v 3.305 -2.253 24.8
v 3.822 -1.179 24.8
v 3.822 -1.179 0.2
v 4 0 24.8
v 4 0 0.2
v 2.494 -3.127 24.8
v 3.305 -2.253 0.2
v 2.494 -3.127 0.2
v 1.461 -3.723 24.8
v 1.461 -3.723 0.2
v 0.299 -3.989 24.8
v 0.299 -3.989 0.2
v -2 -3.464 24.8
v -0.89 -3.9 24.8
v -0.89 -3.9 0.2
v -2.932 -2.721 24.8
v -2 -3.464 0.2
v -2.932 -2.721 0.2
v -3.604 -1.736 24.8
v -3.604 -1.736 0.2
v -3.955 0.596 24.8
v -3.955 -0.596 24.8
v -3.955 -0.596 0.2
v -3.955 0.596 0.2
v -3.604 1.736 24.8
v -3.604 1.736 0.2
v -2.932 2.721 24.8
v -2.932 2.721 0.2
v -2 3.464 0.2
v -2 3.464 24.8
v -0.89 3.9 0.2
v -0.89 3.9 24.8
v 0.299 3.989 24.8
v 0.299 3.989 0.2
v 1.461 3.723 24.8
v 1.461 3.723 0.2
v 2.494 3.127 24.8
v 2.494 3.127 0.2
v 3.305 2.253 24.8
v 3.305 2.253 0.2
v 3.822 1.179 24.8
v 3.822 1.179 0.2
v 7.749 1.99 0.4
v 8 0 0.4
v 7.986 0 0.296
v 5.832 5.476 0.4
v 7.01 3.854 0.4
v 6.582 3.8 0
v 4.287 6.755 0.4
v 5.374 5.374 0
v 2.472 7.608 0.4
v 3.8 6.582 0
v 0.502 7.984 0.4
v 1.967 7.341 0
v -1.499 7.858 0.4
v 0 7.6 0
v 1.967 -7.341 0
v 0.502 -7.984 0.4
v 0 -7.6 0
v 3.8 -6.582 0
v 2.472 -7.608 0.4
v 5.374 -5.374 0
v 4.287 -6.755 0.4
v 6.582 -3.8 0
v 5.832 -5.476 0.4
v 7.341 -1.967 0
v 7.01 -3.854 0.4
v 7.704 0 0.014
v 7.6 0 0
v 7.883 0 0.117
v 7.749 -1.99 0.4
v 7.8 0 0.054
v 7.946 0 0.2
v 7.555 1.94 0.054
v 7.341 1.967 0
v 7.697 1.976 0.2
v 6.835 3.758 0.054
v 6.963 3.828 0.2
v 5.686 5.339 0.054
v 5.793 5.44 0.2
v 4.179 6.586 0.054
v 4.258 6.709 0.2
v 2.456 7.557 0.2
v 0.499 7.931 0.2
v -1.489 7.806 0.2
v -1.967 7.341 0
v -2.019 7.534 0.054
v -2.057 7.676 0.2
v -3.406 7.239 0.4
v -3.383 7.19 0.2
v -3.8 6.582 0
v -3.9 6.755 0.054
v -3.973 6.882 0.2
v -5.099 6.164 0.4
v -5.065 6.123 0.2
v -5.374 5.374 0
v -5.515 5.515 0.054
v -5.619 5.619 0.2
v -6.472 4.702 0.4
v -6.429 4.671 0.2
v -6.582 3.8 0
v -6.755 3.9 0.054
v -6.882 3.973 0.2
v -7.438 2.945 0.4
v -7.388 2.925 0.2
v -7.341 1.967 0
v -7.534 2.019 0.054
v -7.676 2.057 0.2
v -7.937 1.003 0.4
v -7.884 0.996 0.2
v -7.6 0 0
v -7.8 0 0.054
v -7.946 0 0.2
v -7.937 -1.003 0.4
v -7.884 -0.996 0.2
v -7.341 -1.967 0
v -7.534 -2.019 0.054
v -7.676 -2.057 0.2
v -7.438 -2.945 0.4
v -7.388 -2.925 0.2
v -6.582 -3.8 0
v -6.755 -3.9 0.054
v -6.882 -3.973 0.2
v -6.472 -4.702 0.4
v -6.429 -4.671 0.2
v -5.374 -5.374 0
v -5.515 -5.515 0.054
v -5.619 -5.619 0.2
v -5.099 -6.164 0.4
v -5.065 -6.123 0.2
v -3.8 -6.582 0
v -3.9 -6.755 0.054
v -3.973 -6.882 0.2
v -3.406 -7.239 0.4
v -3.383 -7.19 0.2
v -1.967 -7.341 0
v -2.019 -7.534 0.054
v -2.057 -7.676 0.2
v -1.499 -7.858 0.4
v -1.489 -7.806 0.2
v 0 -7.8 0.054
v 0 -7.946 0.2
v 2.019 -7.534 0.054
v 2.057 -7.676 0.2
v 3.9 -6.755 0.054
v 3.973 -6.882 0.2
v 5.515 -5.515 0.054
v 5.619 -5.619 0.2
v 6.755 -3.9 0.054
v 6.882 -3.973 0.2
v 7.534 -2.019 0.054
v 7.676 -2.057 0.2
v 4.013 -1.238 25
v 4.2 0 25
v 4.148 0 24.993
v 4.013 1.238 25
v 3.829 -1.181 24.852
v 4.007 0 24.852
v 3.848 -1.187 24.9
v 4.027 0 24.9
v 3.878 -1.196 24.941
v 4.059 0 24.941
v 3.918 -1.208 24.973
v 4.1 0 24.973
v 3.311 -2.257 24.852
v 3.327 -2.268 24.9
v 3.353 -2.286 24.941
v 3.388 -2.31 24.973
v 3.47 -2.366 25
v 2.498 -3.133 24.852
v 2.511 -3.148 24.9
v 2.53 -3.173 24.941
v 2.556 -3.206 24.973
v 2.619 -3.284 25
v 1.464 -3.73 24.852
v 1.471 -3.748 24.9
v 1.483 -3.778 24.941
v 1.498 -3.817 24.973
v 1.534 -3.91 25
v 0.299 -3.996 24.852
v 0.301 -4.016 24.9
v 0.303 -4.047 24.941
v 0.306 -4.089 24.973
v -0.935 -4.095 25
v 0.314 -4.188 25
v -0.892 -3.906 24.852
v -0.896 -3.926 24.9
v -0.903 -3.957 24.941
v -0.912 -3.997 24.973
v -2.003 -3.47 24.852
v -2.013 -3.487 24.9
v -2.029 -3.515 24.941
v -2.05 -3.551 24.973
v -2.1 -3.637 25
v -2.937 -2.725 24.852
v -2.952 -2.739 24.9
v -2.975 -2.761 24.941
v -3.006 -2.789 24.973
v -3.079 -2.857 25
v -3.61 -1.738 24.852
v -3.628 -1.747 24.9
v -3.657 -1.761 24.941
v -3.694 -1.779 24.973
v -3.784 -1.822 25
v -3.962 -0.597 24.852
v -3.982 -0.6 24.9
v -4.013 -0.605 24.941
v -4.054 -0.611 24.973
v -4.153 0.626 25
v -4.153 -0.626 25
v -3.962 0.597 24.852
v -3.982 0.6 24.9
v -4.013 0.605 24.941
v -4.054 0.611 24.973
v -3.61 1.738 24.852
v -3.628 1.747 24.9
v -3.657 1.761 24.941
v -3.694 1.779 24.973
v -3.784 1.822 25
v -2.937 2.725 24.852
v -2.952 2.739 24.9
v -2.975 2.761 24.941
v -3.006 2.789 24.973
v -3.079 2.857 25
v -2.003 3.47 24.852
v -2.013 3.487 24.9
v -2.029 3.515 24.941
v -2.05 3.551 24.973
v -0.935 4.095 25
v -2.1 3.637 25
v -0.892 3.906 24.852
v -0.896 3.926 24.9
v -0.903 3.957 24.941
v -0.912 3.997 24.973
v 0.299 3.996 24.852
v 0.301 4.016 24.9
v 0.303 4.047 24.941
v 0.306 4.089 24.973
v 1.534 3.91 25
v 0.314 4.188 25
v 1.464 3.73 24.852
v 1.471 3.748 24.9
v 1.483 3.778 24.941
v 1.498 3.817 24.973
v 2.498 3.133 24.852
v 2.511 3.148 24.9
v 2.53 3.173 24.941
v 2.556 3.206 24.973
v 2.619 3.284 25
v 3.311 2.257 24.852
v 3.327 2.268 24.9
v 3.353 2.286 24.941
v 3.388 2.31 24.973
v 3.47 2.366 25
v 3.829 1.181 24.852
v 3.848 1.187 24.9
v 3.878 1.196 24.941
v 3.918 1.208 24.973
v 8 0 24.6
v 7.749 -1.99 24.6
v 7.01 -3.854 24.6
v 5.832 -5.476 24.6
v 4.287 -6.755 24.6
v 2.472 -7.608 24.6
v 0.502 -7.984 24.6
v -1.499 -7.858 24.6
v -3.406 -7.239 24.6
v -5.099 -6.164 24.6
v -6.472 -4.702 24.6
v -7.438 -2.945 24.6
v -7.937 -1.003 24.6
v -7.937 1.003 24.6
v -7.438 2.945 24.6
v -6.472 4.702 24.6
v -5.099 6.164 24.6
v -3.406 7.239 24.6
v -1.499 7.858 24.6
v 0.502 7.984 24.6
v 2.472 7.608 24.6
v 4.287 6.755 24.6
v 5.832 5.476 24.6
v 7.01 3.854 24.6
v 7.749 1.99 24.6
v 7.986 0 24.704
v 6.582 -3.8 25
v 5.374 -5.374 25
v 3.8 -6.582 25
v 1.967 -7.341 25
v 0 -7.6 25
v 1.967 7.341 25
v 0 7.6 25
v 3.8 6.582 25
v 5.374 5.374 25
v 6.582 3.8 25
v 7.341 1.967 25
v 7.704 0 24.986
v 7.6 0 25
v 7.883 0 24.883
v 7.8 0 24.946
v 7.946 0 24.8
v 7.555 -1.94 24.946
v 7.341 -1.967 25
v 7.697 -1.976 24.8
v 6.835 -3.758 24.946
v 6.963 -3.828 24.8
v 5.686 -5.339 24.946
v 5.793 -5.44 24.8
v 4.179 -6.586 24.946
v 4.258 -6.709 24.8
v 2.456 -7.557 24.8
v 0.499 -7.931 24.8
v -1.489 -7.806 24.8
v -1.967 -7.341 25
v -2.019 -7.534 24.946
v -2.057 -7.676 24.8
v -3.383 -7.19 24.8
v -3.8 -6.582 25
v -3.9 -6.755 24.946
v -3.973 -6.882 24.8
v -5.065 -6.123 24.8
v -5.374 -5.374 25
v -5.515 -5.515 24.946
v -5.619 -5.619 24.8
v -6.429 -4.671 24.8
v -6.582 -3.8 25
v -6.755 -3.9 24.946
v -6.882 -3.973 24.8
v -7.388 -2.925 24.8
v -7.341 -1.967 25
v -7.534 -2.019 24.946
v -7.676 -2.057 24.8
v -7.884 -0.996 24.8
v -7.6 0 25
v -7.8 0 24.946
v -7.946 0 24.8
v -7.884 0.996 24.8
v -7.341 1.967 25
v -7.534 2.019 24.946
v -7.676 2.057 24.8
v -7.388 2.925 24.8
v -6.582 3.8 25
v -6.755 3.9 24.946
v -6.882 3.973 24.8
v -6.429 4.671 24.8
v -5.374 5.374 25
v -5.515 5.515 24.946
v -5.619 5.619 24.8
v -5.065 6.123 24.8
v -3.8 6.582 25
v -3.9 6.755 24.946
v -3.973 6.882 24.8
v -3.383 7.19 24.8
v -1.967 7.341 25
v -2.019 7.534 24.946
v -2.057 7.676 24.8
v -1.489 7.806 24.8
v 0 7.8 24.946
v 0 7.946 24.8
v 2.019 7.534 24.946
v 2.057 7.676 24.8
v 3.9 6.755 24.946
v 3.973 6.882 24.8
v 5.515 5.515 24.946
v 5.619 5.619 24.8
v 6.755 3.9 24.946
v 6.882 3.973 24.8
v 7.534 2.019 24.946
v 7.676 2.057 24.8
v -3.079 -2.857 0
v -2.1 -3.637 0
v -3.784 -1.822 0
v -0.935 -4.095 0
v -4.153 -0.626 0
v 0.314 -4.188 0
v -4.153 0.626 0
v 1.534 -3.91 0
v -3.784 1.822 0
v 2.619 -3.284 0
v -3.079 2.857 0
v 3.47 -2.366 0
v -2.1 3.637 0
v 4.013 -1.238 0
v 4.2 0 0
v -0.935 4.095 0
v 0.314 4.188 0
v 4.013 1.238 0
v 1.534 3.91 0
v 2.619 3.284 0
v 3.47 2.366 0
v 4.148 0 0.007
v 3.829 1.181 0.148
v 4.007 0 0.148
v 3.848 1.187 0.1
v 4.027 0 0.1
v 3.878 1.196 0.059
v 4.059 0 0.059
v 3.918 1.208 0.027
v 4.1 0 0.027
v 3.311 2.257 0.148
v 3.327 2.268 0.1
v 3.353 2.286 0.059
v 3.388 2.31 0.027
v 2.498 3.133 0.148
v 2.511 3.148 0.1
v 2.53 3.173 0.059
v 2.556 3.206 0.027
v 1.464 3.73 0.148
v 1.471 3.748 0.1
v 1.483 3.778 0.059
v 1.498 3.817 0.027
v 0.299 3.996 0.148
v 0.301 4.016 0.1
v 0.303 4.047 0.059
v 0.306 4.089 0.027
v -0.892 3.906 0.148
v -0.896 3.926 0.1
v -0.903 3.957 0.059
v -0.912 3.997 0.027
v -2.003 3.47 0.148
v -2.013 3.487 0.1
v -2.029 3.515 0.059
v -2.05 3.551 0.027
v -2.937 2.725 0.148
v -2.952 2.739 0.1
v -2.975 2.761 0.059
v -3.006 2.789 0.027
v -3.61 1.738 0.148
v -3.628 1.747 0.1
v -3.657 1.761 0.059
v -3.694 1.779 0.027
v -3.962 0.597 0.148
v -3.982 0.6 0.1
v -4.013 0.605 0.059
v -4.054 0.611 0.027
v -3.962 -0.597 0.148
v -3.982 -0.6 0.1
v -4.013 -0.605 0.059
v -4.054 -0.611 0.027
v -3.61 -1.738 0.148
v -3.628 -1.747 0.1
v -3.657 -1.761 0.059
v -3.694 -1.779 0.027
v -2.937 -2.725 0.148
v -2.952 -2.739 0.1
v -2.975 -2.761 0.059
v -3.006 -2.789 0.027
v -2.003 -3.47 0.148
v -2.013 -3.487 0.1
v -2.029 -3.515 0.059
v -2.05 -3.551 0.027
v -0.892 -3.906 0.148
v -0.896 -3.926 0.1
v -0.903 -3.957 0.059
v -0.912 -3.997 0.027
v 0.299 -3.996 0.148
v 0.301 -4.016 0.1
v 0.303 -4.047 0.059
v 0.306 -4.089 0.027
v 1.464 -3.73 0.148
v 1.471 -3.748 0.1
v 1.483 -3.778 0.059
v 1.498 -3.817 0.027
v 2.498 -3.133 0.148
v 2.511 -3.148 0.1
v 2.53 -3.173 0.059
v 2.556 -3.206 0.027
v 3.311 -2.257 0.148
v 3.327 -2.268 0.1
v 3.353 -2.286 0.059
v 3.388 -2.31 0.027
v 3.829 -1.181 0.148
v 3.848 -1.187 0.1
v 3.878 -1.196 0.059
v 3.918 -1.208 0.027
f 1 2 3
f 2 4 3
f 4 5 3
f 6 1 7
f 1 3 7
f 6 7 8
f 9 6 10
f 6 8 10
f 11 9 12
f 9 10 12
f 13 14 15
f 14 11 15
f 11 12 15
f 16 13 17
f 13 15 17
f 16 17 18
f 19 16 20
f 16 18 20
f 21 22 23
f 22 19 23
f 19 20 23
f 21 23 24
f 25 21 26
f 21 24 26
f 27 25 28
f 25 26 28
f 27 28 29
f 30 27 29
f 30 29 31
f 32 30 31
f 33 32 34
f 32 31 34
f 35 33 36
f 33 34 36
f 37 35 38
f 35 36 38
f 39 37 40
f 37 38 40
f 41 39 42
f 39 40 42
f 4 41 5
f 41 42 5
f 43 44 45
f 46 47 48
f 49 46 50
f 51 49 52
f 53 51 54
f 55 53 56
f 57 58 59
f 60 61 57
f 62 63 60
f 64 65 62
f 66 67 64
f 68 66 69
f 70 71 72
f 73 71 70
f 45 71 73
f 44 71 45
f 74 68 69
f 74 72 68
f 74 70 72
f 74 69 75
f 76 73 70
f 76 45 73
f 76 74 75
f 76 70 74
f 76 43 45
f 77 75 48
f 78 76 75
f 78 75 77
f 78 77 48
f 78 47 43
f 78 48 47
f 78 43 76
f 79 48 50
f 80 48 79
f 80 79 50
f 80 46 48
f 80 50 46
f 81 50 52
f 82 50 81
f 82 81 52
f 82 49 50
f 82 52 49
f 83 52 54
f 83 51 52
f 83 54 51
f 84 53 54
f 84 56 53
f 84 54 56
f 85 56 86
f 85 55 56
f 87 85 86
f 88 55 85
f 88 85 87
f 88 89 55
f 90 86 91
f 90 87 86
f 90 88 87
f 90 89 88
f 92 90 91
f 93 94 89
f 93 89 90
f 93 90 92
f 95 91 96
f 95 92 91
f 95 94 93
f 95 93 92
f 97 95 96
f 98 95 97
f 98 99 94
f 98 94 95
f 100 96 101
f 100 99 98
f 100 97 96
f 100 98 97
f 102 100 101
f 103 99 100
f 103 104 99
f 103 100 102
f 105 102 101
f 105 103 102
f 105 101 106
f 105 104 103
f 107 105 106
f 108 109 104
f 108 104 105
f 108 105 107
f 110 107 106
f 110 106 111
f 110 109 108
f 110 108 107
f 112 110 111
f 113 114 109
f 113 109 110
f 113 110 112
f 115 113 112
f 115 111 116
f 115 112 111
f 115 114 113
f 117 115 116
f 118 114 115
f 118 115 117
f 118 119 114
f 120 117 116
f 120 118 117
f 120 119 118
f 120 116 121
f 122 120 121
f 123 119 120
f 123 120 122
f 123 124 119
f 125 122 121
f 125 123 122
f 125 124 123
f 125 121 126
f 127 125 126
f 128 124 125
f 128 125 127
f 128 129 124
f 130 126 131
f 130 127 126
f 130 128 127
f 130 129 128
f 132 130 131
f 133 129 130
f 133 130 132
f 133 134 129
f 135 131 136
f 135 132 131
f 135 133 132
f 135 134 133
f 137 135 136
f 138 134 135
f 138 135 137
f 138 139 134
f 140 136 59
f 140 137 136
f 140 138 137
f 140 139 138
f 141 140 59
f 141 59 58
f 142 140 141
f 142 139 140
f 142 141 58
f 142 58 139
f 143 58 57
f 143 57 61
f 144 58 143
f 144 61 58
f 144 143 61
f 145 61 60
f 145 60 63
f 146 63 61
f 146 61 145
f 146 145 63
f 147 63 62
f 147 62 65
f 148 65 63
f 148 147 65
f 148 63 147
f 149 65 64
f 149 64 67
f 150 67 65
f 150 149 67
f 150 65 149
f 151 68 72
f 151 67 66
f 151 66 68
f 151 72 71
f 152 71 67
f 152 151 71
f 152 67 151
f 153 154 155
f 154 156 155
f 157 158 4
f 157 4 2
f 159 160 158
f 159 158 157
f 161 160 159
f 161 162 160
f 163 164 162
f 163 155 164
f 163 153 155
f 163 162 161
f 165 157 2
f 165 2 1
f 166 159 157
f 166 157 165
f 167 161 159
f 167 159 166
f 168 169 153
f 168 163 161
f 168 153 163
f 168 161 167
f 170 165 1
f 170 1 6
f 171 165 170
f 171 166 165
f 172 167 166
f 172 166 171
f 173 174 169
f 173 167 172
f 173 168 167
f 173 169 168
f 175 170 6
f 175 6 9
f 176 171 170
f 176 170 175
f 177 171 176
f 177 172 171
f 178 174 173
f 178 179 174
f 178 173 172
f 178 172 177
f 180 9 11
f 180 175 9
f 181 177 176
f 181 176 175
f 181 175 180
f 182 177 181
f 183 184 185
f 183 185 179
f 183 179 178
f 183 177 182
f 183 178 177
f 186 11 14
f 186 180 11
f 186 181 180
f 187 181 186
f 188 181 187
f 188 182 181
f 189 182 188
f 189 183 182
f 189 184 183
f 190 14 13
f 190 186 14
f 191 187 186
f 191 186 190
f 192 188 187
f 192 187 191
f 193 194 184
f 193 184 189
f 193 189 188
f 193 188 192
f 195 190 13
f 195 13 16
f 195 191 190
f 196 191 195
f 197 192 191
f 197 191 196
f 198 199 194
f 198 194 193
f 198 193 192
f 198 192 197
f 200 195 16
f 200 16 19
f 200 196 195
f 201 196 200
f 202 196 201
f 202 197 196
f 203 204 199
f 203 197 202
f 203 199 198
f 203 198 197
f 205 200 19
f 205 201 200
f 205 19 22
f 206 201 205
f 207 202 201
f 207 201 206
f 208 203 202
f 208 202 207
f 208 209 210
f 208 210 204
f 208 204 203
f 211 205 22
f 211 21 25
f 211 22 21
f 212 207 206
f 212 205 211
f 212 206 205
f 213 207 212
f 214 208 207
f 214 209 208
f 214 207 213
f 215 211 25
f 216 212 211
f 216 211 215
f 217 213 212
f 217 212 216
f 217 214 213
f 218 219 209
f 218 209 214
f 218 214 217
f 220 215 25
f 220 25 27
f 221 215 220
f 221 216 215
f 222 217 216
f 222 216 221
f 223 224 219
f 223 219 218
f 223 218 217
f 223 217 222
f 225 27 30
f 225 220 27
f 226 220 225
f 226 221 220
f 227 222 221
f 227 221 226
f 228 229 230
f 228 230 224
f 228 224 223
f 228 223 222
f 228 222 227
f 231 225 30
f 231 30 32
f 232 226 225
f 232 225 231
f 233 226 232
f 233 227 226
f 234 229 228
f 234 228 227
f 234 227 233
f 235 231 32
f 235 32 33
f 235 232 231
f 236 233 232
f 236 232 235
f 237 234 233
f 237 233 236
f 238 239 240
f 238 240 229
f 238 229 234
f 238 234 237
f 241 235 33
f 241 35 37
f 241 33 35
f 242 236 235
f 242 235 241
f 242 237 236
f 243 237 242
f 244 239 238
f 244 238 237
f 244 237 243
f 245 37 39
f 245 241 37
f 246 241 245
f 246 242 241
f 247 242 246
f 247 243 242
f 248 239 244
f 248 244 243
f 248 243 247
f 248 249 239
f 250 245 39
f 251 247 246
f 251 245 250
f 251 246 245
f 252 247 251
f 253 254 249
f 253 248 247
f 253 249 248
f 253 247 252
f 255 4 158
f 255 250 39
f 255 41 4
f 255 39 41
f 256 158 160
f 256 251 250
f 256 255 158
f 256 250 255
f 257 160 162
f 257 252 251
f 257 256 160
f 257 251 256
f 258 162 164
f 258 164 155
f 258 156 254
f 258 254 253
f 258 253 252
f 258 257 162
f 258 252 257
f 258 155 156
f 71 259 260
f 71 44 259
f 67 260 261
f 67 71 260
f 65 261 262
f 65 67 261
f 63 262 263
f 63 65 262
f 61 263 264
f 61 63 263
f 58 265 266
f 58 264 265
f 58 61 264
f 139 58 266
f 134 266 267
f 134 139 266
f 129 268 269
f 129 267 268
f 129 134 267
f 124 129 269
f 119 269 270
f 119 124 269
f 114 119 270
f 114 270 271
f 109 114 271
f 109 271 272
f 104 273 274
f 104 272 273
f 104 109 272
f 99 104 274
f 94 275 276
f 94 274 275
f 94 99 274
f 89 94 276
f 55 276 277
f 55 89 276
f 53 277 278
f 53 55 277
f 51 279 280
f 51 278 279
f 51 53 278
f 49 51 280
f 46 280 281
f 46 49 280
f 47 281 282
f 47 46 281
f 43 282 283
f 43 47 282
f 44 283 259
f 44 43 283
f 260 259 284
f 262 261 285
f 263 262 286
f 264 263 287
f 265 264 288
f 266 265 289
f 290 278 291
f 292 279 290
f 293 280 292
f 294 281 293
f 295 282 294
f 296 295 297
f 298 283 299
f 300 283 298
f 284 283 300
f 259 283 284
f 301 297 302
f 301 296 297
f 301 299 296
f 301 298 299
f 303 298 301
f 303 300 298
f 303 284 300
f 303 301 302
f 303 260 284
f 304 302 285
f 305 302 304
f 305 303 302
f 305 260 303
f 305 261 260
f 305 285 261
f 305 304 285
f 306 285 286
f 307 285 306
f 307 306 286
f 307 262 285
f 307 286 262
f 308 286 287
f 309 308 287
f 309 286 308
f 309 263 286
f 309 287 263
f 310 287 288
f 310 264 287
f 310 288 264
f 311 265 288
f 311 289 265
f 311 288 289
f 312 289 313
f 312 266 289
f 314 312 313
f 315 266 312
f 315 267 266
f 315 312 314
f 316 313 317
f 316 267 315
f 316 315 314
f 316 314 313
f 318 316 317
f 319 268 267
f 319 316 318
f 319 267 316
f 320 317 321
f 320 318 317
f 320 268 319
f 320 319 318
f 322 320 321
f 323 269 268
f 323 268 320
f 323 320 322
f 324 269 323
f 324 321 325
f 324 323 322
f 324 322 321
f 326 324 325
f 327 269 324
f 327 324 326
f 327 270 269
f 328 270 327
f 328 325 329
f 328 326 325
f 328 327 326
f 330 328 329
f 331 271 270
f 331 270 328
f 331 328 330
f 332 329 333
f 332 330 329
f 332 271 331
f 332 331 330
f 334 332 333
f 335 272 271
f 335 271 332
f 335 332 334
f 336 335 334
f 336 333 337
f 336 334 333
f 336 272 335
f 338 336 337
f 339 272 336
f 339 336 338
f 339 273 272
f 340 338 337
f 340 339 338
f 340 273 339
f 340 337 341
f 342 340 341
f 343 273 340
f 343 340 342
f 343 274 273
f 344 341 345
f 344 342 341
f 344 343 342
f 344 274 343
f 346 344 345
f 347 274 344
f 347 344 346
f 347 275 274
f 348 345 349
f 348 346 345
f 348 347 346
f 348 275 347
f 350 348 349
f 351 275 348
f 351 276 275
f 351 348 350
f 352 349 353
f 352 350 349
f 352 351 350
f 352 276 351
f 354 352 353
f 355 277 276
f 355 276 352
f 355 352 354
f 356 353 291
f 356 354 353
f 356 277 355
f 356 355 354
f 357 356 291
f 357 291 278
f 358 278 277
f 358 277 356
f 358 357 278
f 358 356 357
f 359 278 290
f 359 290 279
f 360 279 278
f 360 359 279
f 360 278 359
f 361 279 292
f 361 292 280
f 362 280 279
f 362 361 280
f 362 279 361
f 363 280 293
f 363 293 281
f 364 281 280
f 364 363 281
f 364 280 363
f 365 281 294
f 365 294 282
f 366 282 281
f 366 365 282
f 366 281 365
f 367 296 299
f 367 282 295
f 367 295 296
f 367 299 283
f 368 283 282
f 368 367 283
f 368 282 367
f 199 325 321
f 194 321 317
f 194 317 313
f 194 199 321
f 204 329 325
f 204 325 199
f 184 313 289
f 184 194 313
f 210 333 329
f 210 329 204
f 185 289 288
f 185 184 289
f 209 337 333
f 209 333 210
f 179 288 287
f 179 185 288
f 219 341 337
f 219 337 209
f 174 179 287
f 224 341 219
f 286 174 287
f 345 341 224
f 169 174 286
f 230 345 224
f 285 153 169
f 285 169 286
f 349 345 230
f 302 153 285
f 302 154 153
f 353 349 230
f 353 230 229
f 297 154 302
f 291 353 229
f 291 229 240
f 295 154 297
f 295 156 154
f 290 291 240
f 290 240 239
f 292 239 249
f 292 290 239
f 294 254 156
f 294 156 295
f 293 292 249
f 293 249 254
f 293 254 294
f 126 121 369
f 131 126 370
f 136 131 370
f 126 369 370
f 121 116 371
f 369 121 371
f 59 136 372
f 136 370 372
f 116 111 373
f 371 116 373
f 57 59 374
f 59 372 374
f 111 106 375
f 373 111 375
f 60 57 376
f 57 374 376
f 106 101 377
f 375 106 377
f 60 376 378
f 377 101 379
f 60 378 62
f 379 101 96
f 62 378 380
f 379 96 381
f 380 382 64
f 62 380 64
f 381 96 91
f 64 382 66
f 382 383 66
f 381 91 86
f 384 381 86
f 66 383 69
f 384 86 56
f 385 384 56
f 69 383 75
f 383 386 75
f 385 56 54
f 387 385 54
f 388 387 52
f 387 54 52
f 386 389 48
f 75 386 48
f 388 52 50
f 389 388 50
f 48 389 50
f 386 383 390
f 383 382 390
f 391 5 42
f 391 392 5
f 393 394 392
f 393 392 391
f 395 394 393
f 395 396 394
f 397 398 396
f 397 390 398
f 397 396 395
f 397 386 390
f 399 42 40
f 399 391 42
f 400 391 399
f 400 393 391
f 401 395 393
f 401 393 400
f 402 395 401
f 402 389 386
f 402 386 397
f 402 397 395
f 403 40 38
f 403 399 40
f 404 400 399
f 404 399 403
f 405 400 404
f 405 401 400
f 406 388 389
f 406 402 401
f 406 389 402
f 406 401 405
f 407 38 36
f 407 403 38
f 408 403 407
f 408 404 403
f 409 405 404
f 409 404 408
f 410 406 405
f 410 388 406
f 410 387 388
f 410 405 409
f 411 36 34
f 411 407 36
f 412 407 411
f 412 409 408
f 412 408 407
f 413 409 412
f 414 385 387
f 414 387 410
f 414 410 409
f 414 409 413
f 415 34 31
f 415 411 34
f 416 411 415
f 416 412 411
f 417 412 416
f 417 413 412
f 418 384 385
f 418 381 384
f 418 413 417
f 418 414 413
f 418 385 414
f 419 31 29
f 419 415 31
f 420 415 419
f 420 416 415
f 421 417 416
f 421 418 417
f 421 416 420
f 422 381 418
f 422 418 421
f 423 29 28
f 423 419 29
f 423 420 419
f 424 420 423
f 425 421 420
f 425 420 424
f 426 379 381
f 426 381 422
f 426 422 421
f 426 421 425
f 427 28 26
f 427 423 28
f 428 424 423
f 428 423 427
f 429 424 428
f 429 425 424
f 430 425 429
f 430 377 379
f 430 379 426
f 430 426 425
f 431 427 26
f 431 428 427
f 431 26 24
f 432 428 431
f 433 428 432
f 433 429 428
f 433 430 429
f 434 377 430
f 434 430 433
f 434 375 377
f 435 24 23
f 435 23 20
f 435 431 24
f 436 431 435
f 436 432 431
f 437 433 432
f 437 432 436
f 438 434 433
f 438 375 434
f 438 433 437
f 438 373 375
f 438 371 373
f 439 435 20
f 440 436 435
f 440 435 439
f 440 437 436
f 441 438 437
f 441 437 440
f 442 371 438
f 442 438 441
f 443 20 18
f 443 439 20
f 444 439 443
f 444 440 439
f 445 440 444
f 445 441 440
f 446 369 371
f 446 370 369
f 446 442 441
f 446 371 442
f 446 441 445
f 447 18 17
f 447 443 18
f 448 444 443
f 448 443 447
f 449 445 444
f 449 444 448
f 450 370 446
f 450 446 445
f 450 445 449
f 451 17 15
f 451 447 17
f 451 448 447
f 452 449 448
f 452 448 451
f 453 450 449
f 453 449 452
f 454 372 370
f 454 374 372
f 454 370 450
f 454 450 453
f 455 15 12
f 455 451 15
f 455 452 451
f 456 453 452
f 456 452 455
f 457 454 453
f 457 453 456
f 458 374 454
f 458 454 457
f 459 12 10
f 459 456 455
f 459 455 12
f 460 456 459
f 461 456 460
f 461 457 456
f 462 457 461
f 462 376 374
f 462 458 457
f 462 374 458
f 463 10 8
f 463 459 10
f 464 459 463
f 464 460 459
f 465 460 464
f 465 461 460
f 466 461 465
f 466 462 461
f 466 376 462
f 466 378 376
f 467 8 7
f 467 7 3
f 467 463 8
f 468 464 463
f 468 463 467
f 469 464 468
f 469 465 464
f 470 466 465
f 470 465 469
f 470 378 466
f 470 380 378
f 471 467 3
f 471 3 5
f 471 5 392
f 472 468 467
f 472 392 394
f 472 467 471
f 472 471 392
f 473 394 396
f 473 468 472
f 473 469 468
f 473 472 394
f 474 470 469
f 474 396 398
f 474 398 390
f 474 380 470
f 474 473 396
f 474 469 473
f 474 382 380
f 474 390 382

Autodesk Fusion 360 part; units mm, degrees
sketch "Sketch1" plane through (0, 0, 0) normal (0, 0, 1) x (1, 0, 0)
  circle A0 centre (0, 0) radius 8
  circle A1 centre (0, 0) radius 4
  dimension "d1" = 8
  dimension "d2" = 16
extrude "Extrude1" add sketch "Sketch1" along normal blind 25 makes body 1
fillet "Fillet1" radius 0.2 2 edges at (-3.7293, 1.4465, 25) (-3.7293, 1.4465, 0) on bodies 1
fillet "Fillet2" radius 0.4 2 edges at (-7.4586, -2.8929, 25) (-7.4586, -2.8929, 0) on bodies 1
copy_body "Body->Comp1" bodies 1 removing the originals makes body 2 in component "Component"
component "Component" placed x (1, 0, 0) y (0, 1, 0) z (0, 0, 1) at (0, 0, 0)
